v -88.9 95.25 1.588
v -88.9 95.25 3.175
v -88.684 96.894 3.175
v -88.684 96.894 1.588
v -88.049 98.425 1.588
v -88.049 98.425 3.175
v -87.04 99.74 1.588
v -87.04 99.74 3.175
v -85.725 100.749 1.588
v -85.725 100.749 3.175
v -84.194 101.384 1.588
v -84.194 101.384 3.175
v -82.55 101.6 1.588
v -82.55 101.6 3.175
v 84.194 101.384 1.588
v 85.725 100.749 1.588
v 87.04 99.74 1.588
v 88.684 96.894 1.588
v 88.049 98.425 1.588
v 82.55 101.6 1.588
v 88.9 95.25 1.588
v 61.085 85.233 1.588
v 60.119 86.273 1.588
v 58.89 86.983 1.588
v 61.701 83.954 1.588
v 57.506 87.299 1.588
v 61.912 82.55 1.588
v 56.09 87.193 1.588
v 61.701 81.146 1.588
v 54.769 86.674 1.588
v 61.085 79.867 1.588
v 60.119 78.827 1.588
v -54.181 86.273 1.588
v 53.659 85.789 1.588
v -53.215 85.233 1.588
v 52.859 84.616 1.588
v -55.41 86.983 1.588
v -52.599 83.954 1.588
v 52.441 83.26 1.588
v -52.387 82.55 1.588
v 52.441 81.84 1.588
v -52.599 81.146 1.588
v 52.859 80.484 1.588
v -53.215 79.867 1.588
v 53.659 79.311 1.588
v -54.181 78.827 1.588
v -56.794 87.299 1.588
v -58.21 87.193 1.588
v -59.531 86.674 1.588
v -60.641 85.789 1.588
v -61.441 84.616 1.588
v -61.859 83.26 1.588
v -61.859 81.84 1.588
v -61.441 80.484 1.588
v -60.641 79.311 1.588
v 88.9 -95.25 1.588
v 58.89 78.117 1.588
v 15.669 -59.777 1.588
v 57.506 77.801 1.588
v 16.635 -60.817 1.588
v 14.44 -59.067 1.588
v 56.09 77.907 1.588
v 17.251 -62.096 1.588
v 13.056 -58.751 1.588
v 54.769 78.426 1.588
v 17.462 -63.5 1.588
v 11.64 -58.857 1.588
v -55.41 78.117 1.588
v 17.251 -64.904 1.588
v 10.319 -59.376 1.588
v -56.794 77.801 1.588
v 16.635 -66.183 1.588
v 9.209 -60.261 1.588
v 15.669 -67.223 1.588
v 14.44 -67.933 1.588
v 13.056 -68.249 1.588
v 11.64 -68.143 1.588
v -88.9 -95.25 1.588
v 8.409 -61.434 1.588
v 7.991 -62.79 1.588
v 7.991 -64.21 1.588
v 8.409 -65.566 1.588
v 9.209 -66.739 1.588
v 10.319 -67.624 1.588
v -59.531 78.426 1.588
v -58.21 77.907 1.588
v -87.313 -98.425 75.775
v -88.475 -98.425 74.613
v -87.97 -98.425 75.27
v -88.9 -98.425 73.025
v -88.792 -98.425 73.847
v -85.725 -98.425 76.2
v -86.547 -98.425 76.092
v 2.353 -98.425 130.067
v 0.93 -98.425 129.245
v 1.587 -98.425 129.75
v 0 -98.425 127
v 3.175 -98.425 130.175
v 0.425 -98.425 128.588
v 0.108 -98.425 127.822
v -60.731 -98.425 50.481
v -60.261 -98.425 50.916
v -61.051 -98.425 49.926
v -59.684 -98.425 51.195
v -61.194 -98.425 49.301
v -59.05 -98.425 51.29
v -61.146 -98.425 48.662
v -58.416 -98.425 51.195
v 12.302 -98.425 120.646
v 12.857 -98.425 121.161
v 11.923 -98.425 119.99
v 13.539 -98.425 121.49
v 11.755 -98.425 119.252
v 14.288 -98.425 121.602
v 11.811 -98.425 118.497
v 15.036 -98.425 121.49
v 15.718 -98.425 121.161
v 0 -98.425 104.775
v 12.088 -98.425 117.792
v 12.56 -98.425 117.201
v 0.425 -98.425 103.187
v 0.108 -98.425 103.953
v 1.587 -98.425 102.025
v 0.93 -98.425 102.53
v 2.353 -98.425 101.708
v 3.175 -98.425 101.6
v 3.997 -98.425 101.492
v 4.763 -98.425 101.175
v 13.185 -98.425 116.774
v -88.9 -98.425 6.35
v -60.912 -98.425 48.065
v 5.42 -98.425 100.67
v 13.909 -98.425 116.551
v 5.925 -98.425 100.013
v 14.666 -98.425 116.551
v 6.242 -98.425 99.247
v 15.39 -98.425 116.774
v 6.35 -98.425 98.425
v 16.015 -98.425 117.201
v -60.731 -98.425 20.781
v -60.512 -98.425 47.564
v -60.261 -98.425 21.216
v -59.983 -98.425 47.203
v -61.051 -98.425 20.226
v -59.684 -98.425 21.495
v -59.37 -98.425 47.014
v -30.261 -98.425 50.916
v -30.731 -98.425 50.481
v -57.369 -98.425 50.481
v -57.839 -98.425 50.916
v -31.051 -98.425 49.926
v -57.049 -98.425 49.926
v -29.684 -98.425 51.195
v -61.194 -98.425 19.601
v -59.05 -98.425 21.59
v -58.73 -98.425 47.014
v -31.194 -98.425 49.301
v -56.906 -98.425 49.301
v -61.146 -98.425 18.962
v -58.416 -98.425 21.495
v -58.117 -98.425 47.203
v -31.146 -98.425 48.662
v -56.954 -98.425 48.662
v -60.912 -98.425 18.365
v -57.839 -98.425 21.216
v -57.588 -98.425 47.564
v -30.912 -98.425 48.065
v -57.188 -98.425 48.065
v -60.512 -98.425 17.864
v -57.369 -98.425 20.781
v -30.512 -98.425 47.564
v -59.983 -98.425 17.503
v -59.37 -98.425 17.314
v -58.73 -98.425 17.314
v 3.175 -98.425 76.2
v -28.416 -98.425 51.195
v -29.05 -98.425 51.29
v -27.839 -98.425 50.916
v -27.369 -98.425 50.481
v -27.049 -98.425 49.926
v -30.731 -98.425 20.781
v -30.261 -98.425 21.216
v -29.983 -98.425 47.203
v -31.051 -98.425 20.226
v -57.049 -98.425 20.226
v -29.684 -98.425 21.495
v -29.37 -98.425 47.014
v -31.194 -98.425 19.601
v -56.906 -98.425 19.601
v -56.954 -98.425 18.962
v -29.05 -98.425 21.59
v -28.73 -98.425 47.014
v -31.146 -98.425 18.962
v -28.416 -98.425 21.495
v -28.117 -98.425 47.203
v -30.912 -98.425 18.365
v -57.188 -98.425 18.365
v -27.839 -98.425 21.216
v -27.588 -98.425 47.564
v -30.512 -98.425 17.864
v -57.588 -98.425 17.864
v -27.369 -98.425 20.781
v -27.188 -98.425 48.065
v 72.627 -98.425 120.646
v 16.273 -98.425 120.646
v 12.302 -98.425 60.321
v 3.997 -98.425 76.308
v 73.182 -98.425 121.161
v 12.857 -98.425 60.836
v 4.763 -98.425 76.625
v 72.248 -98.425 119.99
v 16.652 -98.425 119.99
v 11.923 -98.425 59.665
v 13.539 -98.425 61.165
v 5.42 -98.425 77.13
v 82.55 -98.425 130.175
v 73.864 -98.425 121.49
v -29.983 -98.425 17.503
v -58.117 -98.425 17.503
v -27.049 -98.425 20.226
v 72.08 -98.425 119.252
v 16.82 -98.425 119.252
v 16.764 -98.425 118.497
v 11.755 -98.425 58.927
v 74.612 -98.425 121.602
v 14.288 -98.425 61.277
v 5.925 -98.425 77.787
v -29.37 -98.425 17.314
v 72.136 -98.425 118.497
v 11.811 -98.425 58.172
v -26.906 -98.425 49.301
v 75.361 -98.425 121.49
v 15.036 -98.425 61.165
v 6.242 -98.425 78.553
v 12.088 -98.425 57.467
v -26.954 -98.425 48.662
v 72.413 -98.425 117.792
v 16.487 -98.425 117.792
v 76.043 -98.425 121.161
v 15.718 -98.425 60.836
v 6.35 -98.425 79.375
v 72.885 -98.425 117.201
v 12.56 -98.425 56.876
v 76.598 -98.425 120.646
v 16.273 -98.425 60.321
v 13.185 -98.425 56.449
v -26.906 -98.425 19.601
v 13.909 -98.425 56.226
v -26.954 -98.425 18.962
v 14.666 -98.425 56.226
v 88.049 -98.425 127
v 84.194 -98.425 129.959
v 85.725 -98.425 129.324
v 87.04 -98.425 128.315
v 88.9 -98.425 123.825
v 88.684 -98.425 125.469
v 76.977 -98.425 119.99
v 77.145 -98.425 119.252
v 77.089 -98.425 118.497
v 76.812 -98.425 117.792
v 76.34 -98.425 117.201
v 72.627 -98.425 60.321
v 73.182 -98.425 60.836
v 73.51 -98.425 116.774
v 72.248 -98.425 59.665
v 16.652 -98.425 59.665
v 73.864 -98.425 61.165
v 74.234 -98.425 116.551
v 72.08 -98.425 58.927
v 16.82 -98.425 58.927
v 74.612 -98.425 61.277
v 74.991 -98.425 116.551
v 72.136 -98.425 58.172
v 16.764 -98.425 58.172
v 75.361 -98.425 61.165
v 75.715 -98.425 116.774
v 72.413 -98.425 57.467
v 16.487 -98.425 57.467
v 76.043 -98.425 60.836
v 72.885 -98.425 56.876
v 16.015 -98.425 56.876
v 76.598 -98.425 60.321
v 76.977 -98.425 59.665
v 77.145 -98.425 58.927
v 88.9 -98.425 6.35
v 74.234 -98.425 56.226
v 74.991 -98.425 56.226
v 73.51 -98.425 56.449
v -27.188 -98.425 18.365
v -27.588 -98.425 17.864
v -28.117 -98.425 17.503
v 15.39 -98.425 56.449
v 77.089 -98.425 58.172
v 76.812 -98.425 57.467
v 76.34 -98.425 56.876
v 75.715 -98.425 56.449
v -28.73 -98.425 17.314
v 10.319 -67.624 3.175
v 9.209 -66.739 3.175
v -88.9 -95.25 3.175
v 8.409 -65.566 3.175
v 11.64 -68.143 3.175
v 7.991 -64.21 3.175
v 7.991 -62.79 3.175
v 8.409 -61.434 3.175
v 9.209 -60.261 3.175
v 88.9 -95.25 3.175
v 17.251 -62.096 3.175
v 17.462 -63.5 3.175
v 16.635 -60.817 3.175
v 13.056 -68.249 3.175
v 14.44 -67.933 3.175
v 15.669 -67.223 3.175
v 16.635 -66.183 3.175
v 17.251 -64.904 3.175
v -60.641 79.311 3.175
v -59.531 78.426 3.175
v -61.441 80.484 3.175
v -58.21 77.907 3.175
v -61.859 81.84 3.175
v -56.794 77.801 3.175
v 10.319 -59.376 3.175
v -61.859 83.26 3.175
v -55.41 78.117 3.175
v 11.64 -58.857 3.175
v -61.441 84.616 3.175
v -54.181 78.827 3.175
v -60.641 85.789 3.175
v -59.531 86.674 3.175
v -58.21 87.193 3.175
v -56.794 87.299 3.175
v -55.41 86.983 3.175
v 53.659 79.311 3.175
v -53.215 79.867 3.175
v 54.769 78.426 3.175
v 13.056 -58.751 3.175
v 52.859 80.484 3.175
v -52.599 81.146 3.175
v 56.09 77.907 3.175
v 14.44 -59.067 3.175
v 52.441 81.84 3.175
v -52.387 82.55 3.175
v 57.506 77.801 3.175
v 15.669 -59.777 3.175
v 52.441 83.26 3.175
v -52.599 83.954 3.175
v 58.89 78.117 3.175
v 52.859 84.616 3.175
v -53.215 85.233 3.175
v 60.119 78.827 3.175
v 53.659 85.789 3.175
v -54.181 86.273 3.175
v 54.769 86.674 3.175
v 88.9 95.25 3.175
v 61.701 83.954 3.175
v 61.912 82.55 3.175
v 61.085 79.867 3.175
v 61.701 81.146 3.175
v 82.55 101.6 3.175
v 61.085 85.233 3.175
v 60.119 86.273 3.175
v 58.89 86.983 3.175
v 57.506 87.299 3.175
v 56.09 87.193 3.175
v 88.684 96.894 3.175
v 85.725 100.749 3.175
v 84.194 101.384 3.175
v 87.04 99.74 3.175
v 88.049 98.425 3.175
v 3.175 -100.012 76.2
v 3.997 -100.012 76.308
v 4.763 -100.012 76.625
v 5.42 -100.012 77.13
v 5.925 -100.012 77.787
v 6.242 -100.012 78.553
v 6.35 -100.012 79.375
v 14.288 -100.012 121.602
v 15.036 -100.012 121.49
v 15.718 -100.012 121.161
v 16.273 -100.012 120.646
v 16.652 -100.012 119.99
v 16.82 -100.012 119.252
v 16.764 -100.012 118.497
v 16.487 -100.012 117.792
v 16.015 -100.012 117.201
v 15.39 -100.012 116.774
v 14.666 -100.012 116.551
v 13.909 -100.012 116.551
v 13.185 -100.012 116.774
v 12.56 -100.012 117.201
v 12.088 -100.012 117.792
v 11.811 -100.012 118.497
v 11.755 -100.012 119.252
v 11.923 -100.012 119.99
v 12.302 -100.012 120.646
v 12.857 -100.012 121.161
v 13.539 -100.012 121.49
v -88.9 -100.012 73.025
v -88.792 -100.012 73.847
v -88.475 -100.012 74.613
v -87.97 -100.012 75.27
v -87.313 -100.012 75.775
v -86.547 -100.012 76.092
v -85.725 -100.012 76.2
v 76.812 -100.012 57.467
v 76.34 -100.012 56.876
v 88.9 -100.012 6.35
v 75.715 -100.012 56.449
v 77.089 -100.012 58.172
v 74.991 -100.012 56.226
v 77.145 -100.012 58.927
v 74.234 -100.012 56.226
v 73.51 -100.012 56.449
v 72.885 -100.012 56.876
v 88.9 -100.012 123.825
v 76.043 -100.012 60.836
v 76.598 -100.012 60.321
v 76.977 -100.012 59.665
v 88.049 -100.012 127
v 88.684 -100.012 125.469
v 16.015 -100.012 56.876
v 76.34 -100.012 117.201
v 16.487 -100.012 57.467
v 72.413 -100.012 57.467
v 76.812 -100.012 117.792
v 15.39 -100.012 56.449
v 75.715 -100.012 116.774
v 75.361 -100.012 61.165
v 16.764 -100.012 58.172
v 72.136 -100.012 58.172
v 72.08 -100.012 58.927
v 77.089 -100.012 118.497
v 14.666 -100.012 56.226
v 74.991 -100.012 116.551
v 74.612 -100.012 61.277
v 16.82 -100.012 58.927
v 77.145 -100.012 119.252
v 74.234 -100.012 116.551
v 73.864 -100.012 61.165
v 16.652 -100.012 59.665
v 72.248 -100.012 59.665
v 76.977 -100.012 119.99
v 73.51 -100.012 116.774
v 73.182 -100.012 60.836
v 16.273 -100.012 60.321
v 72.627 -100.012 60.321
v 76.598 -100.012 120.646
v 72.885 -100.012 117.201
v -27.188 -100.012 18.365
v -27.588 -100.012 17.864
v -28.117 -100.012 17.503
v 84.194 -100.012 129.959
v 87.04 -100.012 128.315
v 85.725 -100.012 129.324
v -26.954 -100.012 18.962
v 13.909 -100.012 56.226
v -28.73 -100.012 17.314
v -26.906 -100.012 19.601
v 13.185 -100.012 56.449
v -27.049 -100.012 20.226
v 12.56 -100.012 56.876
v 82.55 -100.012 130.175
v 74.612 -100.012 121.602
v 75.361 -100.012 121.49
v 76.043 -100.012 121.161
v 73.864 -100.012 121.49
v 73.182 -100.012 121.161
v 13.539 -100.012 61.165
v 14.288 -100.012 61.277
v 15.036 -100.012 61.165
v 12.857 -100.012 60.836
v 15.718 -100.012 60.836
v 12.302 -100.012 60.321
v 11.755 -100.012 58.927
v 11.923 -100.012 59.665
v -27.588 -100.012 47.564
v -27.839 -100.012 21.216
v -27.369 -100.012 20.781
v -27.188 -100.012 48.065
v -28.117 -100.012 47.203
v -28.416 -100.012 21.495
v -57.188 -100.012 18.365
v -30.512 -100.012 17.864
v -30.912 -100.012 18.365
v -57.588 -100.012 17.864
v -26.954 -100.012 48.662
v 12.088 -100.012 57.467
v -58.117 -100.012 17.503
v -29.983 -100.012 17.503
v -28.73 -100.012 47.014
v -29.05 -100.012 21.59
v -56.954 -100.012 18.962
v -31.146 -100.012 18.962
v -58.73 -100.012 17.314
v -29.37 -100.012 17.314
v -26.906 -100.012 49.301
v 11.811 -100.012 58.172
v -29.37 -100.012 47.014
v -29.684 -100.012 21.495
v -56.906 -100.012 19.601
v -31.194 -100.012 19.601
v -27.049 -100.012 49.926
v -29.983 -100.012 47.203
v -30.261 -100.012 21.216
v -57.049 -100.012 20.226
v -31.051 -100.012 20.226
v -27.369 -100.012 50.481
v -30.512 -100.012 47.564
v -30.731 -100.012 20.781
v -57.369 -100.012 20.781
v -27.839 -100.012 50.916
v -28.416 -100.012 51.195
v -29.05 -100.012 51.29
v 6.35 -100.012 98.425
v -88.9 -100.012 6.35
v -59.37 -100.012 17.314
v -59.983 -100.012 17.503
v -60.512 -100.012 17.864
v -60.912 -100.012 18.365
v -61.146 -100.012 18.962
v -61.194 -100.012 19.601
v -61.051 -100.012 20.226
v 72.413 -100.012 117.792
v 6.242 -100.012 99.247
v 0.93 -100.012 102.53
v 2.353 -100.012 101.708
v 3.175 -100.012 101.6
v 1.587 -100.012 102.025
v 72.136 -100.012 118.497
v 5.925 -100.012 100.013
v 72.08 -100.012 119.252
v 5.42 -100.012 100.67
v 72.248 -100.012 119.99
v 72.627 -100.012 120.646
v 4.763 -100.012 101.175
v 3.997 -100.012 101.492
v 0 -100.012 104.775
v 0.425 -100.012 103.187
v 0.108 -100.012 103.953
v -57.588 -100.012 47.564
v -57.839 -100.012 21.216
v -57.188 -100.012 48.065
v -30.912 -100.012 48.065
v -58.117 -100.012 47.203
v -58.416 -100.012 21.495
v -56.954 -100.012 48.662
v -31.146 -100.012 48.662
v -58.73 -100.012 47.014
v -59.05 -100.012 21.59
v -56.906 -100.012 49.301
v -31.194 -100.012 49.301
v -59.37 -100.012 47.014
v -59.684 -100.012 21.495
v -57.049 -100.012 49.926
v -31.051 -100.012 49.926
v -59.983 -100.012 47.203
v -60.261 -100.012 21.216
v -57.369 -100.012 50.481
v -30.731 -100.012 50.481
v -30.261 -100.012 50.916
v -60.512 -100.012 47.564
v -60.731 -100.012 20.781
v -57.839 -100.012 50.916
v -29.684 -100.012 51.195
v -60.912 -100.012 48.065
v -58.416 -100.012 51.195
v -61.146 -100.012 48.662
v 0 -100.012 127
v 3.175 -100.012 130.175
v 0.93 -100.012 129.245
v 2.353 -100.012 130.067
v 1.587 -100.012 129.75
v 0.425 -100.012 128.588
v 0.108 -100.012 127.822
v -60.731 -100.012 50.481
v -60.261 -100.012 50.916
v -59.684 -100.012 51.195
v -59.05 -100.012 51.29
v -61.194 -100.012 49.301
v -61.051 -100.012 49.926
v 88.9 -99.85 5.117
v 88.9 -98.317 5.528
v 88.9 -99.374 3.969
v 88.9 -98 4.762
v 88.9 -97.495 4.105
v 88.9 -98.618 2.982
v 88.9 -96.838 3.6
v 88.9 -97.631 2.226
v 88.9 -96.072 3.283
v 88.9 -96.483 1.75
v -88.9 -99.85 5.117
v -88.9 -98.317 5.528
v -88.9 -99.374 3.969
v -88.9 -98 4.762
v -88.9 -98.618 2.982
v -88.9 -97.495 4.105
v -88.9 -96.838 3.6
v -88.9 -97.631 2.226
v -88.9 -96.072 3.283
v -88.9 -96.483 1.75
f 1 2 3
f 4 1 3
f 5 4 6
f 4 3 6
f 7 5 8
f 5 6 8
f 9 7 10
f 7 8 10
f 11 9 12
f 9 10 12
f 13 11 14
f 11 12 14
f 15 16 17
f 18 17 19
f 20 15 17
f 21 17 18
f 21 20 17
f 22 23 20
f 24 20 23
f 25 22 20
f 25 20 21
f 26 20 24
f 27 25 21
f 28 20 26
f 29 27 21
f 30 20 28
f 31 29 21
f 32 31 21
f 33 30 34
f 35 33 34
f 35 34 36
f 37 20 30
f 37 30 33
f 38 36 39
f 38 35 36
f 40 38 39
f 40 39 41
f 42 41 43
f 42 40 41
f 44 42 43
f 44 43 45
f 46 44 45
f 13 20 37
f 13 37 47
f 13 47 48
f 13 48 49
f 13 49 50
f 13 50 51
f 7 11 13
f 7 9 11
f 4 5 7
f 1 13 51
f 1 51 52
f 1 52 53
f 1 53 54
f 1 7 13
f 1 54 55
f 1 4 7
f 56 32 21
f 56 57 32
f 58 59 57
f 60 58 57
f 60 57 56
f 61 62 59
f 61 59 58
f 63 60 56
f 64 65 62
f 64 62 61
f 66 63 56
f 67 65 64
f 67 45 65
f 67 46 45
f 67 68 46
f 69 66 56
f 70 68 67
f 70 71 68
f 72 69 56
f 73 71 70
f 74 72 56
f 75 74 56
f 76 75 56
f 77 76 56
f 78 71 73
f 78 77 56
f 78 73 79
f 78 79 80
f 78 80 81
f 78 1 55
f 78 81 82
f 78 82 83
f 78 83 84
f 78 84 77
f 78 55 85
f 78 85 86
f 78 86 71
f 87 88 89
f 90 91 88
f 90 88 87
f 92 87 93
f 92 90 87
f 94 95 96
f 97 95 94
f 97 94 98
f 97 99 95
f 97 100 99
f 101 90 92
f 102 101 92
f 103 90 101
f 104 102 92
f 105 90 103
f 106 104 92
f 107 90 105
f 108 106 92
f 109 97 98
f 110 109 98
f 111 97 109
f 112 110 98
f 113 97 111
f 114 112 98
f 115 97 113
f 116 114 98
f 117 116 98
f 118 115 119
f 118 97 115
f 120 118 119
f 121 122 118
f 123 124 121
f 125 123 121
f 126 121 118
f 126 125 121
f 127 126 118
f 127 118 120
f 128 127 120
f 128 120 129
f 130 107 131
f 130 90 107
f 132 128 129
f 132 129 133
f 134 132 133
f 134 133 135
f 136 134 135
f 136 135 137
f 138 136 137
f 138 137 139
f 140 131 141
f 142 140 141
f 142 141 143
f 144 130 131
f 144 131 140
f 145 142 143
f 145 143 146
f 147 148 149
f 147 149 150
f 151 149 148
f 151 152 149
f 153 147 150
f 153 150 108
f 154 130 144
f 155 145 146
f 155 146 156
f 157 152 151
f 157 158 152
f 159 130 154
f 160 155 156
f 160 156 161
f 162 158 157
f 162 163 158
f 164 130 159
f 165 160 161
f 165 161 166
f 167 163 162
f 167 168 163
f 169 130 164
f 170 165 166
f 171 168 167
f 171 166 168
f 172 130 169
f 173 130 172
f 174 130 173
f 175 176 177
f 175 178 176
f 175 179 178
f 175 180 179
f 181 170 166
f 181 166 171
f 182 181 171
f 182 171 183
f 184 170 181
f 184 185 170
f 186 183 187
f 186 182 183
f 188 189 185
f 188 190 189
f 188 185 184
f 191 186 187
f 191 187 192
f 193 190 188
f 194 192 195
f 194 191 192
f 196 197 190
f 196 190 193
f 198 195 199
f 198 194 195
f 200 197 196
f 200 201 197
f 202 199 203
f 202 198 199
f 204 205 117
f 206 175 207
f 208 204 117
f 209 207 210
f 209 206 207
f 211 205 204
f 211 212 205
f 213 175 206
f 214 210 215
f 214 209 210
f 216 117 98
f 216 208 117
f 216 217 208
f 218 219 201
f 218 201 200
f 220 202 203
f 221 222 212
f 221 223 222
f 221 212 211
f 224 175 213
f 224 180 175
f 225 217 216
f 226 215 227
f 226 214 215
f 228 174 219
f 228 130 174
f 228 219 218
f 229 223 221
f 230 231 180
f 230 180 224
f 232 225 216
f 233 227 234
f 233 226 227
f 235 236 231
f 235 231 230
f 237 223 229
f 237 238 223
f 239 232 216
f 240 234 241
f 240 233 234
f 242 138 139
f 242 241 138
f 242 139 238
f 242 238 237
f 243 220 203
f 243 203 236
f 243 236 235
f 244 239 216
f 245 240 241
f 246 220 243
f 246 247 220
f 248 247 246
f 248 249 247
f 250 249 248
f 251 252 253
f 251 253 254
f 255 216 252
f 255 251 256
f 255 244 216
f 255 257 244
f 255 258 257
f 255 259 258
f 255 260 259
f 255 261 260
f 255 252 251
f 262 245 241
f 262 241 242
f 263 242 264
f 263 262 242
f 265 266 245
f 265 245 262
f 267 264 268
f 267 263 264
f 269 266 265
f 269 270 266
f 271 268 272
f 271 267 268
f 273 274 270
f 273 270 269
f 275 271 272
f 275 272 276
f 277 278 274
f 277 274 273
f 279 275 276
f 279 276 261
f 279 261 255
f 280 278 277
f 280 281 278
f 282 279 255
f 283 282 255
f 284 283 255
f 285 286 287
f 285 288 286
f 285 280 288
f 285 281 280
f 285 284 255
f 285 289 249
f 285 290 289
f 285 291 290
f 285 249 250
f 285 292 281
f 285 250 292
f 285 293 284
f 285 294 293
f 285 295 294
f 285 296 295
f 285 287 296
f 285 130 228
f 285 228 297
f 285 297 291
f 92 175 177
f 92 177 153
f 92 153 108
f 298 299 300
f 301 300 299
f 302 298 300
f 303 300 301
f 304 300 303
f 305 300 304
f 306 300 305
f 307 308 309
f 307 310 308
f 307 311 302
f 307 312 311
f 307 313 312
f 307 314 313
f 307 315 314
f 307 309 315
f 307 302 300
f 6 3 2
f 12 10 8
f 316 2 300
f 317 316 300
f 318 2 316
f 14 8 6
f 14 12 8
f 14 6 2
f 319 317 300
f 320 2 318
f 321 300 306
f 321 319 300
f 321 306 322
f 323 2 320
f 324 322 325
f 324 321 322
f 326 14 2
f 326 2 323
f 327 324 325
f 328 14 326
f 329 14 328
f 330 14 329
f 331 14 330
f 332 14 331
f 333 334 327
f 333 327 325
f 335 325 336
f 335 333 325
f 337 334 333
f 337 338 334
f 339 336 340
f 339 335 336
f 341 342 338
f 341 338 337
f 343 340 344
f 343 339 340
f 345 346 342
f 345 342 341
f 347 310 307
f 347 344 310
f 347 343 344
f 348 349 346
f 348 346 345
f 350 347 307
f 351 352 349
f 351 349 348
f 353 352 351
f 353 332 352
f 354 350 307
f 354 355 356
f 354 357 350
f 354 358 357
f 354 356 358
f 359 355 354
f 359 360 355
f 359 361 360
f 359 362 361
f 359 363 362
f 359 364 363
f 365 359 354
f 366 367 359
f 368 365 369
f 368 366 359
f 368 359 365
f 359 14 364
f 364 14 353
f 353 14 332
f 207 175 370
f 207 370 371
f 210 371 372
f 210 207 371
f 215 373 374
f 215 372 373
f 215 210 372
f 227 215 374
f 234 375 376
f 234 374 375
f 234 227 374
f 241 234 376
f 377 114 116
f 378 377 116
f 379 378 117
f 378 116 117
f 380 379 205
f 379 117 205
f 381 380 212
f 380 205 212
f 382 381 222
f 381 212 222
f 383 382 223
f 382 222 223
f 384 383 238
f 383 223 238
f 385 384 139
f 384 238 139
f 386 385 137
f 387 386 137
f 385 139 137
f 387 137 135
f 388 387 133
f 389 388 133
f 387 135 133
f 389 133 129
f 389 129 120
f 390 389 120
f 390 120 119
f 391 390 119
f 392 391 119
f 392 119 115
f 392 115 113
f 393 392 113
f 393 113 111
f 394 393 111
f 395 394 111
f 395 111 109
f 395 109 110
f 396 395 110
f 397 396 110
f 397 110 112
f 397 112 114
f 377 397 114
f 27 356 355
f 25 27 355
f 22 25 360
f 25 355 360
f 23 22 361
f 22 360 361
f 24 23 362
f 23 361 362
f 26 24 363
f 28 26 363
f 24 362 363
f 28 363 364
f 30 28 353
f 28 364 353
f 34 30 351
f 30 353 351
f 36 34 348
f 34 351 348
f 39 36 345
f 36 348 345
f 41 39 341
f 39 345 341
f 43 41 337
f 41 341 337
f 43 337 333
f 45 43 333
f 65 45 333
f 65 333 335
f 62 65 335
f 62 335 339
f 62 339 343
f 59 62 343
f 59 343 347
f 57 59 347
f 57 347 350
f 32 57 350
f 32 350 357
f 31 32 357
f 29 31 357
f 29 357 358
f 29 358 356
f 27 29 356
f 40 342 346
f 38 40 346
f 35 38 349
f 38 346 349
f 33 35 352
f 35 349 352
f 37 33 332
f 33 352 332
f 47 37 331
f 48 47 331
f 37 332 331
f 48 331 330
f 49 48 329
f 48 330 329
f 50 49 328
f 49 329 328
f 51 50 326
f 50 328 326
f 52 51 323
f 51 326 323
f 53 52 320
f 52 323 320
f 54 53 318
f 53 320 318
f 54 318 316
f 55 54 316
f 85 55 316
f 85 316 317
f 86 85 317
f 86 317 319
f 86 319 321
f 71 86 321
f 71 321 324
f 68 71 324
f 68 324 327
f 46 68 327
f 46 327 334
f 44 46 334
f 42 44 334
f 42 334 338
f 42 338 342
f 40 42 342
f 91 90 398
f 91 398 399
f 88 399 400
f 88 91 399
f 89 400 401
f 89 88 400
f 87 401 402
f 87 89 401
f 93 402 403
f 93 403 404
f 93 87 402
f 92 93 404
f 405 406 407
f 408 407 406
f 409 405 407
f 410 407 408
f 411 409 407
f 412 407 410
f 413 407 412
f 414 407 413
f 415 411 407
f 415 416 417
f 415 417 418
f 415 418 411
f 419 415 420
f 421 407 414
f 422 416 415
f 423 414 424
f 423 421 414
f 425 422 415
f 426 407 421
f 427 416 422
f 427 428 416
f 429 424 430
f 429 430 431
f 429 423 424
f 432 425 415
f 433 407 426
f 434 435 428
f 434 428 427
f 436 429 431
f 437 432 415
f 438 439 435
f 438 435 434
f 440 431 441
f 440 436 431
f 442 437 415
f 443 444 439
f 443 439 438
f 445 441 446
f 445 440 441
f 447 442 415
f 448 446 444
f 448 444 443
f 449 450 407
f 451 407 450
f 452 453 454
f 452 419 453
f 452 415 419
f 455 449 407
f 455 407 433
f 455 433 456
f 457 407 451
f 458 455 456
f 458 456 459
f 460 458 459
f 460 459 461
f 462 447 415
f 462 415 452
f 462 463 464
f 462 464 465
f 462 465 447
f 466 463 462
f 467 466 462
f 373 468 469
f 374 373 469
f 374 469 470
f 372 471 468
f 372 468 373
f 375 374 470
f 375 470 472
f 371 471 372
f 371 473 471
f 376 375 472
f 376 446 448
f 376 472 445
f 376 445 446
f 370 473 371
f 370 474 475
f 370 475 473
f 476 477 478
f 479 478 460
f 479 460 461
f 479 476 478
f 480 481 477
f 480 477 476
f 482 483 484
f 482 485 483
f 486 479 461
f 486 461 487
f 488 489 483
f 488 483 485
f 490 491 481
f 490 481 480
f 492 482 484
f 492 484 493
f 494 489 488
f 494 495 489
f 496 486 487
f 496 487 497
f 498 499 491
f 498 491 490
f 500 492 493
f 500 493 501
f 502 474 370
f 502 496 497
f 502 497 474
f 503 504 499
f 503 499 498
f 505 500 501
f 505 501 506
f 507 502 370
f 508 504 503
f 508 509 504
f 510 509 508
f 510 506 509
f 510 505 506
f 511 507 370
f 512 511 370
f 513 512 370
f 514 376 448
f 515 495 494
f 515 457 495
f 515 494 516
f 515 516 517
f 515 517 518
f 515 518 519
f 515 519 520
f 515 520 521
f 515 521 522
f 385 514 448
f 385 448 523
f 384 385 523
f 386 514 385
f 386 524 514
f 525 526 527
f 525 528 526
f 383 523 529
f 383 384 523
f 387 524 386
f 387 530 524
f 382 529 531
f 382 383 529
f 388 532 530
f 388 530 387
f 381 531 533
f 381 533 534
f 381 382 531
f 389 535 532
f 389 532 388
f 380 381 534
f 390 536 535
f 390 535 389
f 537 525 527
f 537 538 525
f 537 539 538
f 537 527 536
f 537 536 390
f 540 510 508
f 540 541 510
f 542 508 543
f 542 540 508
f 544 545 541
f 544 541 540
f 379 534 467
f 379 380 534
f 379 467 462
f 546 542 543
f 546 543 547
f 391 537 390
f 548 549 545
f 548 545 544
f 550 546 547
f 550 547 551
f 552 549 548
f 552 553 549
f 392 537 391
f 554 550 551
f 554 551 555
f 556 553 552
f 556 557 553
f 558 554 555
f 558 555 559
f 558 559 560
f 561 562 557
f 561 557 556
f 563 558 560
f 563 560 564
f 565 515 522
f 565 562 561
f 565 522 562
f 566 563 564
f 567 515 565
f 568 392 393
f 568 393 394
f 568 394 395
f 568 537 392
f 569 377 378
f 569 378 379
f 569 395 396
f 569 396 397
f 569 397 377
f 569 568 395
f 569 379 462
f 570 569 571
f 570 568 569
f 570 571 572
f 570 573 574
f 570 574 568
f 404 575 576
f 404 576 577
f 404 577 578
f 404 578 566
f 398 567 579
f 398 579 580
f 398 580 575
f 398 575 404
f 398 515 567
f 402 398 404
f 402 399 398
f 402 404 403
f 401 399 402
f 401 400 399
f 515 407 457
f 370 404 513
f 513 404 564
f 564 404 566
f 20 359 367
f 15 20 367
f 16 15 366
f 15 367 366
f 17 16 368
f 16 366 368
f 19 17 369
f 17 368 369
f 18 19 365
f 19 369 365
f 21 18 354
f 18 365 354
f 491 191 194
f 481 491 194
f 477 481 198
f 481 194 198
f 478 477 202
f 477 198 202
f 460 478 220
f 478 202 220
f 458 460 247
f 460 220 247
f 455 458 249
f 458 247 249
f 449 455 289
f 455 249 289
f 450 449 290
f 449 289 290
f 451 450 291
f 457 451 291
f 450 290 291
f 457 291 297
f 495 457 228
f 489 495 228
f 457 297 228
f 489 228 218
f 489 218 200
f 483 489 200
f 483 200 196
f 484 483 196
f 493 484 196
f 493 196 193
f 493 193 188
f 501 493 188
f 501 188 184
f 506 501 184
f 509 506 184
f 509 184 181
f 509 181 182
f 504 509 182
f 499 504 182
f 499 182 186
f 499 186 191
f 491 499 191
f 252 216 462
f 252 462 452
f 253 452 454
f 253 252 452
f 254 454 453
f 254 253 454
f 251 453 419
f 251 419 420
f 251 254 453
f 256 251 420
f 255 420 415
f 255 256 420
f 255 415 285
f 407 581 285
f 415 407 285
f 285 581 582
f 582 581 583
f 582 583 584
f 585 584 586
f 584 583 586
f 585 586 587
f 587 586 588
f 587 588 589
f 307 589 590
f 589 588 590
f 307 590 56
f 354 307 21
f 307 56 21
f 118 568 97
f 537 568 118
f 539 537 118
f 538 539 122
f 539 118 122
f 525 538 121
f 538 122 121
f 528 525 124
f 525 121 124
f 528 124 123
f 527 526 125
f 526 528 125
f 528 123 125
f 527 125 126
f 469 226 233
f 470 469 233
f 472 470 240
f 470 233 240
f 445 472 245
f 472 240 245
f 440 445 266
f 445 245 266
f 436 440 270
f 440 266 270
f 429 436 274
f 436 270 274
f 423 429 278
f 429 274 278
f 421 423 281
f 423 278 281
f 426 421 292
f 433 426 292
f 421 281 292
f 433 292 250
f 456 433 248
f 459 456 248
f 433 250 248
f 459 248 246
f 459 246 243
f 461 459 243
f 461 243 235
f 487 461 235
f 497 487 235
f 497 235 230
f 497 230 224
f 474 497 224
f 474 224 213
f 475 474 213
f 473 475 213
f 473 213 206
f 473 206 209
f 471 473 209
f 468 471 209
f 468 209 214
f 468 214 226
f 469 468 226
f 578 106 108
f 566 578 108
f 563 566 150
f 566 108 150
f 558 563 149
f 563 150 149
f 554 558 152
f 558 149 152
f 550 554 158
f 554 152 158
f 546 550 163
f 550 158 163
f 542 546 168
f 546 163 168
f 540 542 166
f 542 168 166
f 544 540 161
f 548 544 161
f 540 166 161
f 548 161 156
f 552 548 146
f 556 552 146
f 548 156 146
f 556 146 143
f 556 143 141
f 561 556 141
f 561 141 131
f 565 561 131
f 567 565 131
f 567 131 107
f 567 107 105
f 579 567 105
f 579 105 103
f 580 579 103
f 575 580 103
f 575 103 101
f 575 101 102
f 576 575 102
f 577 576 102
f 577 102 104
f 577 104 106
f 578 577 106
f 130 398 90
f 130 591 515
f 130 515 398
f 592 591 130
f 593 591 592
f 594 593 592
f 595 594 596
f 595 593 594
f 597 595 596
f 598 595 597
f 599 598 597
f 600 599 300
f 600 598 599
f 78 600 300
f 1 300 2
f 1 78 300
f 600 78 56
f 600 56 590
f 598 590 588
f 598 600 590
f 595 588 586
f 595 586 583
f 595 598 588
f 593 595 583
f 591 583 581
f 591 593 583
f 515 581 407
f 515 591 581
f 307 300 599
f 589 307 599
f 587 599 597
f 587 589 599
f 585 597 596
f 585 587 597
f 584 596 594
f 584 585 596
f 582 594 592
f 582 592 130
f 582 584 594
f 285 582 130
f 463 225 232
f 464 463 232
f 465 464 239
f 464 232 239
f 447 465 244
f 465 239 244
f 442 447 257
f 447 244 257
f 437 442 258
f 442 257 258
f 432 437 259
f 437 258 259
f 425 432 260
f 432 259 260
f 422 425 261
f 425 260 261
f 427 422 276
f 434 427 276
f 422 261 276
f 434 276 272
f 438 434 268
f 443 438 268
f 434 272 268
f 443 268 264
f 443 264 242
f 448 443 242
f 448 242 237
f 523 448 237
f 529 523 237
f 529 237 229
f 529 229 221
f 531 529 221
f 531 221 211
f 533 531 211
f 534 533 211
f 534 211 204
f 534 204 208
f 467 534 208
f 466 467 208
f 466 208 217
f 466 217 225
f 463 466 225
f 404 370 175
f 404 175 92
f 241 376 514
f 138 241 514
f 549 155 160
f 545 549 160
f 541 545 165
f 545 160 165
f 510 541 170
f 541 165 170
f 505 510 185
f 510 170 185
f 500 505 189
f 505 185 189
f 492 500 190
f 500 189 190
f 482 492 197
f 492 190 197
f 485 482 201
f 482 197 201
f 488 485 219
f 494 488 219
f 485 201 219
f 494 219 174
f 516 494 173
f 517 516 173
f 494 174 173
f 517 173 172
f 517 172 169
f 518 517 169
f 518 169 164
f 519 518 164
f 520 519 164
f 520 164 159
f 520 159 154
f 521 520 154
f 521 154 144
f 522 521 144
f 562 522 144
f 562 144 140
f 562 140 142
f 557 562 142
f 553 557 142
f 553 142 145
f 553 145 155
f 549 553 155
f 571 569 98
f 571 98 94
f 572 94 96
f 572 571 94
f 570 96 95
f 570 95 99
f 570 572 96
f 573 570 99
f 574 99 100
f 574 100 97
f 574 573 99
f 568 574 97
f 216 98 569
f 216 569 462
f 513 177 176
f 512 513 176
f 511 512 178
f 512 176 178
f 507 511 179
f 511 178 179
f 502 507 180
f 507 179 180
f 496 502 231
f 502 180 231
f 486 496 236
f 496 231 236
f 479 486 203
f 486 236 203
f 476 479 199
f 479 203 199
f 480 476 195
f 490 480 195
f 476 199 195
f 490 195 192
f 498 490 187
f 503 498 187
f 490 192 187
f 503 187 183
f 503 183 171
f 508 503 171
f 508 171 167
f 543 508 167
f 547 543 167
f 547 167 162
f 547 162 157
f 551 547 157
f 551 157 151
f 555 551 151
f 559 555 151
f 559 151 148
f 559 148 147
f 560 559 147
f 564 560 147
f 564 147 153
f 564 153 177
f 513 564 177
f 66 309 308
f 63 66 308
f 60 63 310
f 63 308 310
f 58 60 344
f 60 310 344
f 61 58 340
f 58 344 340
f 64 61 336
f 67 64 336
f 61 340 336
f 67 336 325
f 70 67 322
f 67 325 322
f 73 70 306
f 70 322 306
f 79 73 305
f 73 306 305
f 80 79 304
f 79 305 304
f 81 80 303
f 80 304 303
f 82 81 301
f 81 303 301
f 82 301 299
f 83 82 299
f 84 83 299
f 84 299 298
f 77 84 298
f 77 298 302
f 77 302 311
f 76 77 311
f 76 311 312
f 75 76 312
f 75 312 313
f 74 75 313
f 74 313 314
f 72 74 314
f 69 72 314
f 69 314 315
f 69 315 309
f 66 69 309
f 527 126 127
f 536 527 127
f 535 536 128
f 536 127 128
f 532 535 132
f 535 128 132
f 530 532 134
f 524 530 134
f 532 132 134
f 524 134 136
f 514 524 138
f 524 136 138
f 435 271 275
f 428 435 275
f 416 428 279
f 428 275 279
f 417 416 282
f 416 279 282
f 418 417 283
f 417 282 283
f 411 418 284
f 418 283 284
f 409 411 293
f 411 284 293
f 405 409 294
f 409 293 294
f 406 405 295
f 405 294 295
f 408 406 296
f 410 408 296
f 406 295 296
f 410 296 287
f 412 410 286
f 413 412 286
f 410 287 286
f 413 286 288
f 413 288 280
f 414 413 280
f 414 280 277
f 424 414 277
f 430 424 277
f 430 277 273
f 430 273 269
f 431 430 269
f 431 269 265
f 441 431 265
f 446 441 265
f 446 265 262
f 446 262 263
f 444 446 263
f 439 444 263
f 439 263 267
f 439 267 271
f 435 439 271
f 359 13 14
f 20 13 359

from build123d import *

# Parameters (mm, degrees)
SKETCH2_W               = 177.8
SKETCH2_H               = 203.2
BOSS_EXTRUDE1_DEPTH     = 3.175
SKETCH3_W               = 177.8
SKETCH3_H               = 3.175
BOSS_EXTRUDE2_DEPTH     = 127
FILLET1_R               = 3.175
FILLET2_R               = 6.35
CUT_EXTRUDE1_DEPTH      = 255.673793803
CUT_EXTRUDE1_DEPTH_BACK = 255.673793803
FILLET4_R               = 3.175
SKETCH6_R               = 2.54
SKETCH6_R_2             = 2.15
CUT_EXTRUDE2_DEPTH      = 255.673793803
SKETCH7_R               = 4.7625
CUT_EXTRUDE3_DEPTH      = 186.350397895
CONVERT_SOLID1_START    = -88.9
CONVERT_SOLID1_DEPTH    = 177.8


# Read off the part's stored shape, not the designer's step: Convert-Solid1
with BuildPart() as part:
    # Sketch2 → Boss-Extrude1 (new body)
    with BuildSketch(Plane.XY):
        Rectangle(SKETCH2_W, SKETCH2_H)
    extrude(amount=BOSS_EXTRUDE1_DEPTH)

    # Sketch3 → Boss-Extrude2 (add)
    with BuildSketch(Plane.XY.offset(3.175)):
        with Locations((0, -100.0125)):
            Rectangle(SKETCH3_W, SKETCH3_H)
    extrude(amount=BOSS_EXTRUDE2_DEPTH)

    # Fillet1
    fillet1_edges = [part.edges().sort_by_distance(p)[0] for p in [
        (0, -98.425, 3.175),
        (0, -101.6, 0),
    ]]
    fillet(fillet1_edges, radius=FILLET1_R)

    # Fillet2
    fillet2_edges = [part.edges().sort_by_distance(p)[0] for p in [
        (-88.9, -100.0125, 130.175),
        (88.9, -100.0125, 130.175),
        (-88.9, 101.6, 1.5875),
        (88.9, 101.6, 1.5875),
    ]]
    fillet(fillet2_edges, radius=FILLET2_R)

    # Sketch5 → Cut-Extrude1 (cut, two sides: drawn at the far end of the back side and taken through both)
    with BuildSketch(Plane(origin=(0, -98.425, 0), x_dir=(1, 0, 0), z_dir=(0, 1, 0)).offset(-CUT_EXTRUDE1_DEPTH_BACK)):
        Polygon((-485.781273778, -76.2), (-88.9, -76.2), (6.35, -76.2), (6.35, -101.6), (0, -101.6), (0, -130.175), (0, -527.056273778), (-539.971017798, -1108.855450333), (-1025.752291576, -657.999176556), align=None)
    extrude(amount=CUT_EXTRUDE1_DEPTH + CUT_EXTRUDE1_DEPTH_BACK, mode=Mode.SUBTRACT)

    # Fillet4
    fillet4_edges = [part.edges().sort_by_distance(p)[0] for p in [
        (6.35, -100.0125, 101.6),
        (-88.9, -100.0125, 76.2),
        (0, -100.0125, 130.175),
        (0, -100.0125, 101.6),
        (6.35, -100.0125, 76.2),
    ]]
    fillet(fillet4_edges, radius=FILLET4_R - 0.0001)  # a hair under: the kernel refuses the full size

    # Sketch6 → Cut-Extrude2 (cut, through all)
    with BuildSketch(Plane(origin=(0, -98.425, 0), x_dir=(1, 0, 0), z_dir=(0, 1, 0))):
        with Locations(Location((74.6125, -119.0625, 0), (0, 0, 270))):
            Circle(SKETCH6_R)
        with Locations(Location((14.2875, -119.0625, 0), (0, 0, 270))):
            Circle(SKETCH6_R)
        with Locations(Location((14.2875, -58.7375, 0), (0, 0, 270))):
            Circle(SKETCH6_R)
        with Locations(Location((74.6125, -58.7375, 0), (0, 0, 270))):
            Circle(SKETCH6_R)
        with Locations(Location((-29.05, -49.140037229, 0), (0, 0, 270))):
            Circle(SKETCH6_R_2)
        with Locations(Location((-59.05, -49.140037229, 0), (0, 0, 270))):
            Circle(SKETCH6_R_2)
        with Locations(Location((-29.05, -19.440037229, 0), (0, 0, 270))):
            Circle(SKETCH6_R_2)
        with Locations(Location((-59.05, -19.440037229, 0), (0, 0, 270))):
            Circle(SKETCH6_R_2)
    extrude(amount=-CUT_EXTRUDE2_DEPTH, mode=Mode.SUBTRACT)

    # Sketch7 → Cut-Extrude3 (cut, through all)
    with BuildSketch(Plane.XY.offset(3.175)):
        with Locations((-57.15, 82.55)):
            Circle(SKETCH7_R)
        with Locations((57.15, 82.55)):
            Circle(SKETCH7_R)
        with Locations((12.7, -63.5)):
            Circle(SKETCH7_R)
    extrude(amount=-CUT_EXTRUDE3_DEPTH, mode=Mode.SUBTRACT)

    # Convert-Solid1 outline → Convert-Solid1 (cut)
    with BuildSketch(Plane.YZ.offset(CONVERT_SOLID1_START)):
        with BuildLine():
            ThreePointArc((-95.25, 1.5875), (-98.617596045, 2.982403955), (-100.0125, 6.35))
            Line((-100.0125, 6.35), (-100.0125, 130.175))
            Line((-100.0125, 130.175), (-101.6, 130.175))
            Line((-101.6, 130.175), (-101.6, 3.175))
            ThreePointArc((-101.6, 3.175), (-100.67006403, 0.92993597), (-98.425, 0))
            Line((-98.425, 0), (101.6, 0))
            Line((101.6, 0), (101.6, 1.5875))
            Line((101.6, 1.5875), (-95.25, 1.5875))
        make_face()
    extrude(amount=CONVERT_SOLID1_DEPTH, mode=Mode.SUBTRACT)


solid = part.part
